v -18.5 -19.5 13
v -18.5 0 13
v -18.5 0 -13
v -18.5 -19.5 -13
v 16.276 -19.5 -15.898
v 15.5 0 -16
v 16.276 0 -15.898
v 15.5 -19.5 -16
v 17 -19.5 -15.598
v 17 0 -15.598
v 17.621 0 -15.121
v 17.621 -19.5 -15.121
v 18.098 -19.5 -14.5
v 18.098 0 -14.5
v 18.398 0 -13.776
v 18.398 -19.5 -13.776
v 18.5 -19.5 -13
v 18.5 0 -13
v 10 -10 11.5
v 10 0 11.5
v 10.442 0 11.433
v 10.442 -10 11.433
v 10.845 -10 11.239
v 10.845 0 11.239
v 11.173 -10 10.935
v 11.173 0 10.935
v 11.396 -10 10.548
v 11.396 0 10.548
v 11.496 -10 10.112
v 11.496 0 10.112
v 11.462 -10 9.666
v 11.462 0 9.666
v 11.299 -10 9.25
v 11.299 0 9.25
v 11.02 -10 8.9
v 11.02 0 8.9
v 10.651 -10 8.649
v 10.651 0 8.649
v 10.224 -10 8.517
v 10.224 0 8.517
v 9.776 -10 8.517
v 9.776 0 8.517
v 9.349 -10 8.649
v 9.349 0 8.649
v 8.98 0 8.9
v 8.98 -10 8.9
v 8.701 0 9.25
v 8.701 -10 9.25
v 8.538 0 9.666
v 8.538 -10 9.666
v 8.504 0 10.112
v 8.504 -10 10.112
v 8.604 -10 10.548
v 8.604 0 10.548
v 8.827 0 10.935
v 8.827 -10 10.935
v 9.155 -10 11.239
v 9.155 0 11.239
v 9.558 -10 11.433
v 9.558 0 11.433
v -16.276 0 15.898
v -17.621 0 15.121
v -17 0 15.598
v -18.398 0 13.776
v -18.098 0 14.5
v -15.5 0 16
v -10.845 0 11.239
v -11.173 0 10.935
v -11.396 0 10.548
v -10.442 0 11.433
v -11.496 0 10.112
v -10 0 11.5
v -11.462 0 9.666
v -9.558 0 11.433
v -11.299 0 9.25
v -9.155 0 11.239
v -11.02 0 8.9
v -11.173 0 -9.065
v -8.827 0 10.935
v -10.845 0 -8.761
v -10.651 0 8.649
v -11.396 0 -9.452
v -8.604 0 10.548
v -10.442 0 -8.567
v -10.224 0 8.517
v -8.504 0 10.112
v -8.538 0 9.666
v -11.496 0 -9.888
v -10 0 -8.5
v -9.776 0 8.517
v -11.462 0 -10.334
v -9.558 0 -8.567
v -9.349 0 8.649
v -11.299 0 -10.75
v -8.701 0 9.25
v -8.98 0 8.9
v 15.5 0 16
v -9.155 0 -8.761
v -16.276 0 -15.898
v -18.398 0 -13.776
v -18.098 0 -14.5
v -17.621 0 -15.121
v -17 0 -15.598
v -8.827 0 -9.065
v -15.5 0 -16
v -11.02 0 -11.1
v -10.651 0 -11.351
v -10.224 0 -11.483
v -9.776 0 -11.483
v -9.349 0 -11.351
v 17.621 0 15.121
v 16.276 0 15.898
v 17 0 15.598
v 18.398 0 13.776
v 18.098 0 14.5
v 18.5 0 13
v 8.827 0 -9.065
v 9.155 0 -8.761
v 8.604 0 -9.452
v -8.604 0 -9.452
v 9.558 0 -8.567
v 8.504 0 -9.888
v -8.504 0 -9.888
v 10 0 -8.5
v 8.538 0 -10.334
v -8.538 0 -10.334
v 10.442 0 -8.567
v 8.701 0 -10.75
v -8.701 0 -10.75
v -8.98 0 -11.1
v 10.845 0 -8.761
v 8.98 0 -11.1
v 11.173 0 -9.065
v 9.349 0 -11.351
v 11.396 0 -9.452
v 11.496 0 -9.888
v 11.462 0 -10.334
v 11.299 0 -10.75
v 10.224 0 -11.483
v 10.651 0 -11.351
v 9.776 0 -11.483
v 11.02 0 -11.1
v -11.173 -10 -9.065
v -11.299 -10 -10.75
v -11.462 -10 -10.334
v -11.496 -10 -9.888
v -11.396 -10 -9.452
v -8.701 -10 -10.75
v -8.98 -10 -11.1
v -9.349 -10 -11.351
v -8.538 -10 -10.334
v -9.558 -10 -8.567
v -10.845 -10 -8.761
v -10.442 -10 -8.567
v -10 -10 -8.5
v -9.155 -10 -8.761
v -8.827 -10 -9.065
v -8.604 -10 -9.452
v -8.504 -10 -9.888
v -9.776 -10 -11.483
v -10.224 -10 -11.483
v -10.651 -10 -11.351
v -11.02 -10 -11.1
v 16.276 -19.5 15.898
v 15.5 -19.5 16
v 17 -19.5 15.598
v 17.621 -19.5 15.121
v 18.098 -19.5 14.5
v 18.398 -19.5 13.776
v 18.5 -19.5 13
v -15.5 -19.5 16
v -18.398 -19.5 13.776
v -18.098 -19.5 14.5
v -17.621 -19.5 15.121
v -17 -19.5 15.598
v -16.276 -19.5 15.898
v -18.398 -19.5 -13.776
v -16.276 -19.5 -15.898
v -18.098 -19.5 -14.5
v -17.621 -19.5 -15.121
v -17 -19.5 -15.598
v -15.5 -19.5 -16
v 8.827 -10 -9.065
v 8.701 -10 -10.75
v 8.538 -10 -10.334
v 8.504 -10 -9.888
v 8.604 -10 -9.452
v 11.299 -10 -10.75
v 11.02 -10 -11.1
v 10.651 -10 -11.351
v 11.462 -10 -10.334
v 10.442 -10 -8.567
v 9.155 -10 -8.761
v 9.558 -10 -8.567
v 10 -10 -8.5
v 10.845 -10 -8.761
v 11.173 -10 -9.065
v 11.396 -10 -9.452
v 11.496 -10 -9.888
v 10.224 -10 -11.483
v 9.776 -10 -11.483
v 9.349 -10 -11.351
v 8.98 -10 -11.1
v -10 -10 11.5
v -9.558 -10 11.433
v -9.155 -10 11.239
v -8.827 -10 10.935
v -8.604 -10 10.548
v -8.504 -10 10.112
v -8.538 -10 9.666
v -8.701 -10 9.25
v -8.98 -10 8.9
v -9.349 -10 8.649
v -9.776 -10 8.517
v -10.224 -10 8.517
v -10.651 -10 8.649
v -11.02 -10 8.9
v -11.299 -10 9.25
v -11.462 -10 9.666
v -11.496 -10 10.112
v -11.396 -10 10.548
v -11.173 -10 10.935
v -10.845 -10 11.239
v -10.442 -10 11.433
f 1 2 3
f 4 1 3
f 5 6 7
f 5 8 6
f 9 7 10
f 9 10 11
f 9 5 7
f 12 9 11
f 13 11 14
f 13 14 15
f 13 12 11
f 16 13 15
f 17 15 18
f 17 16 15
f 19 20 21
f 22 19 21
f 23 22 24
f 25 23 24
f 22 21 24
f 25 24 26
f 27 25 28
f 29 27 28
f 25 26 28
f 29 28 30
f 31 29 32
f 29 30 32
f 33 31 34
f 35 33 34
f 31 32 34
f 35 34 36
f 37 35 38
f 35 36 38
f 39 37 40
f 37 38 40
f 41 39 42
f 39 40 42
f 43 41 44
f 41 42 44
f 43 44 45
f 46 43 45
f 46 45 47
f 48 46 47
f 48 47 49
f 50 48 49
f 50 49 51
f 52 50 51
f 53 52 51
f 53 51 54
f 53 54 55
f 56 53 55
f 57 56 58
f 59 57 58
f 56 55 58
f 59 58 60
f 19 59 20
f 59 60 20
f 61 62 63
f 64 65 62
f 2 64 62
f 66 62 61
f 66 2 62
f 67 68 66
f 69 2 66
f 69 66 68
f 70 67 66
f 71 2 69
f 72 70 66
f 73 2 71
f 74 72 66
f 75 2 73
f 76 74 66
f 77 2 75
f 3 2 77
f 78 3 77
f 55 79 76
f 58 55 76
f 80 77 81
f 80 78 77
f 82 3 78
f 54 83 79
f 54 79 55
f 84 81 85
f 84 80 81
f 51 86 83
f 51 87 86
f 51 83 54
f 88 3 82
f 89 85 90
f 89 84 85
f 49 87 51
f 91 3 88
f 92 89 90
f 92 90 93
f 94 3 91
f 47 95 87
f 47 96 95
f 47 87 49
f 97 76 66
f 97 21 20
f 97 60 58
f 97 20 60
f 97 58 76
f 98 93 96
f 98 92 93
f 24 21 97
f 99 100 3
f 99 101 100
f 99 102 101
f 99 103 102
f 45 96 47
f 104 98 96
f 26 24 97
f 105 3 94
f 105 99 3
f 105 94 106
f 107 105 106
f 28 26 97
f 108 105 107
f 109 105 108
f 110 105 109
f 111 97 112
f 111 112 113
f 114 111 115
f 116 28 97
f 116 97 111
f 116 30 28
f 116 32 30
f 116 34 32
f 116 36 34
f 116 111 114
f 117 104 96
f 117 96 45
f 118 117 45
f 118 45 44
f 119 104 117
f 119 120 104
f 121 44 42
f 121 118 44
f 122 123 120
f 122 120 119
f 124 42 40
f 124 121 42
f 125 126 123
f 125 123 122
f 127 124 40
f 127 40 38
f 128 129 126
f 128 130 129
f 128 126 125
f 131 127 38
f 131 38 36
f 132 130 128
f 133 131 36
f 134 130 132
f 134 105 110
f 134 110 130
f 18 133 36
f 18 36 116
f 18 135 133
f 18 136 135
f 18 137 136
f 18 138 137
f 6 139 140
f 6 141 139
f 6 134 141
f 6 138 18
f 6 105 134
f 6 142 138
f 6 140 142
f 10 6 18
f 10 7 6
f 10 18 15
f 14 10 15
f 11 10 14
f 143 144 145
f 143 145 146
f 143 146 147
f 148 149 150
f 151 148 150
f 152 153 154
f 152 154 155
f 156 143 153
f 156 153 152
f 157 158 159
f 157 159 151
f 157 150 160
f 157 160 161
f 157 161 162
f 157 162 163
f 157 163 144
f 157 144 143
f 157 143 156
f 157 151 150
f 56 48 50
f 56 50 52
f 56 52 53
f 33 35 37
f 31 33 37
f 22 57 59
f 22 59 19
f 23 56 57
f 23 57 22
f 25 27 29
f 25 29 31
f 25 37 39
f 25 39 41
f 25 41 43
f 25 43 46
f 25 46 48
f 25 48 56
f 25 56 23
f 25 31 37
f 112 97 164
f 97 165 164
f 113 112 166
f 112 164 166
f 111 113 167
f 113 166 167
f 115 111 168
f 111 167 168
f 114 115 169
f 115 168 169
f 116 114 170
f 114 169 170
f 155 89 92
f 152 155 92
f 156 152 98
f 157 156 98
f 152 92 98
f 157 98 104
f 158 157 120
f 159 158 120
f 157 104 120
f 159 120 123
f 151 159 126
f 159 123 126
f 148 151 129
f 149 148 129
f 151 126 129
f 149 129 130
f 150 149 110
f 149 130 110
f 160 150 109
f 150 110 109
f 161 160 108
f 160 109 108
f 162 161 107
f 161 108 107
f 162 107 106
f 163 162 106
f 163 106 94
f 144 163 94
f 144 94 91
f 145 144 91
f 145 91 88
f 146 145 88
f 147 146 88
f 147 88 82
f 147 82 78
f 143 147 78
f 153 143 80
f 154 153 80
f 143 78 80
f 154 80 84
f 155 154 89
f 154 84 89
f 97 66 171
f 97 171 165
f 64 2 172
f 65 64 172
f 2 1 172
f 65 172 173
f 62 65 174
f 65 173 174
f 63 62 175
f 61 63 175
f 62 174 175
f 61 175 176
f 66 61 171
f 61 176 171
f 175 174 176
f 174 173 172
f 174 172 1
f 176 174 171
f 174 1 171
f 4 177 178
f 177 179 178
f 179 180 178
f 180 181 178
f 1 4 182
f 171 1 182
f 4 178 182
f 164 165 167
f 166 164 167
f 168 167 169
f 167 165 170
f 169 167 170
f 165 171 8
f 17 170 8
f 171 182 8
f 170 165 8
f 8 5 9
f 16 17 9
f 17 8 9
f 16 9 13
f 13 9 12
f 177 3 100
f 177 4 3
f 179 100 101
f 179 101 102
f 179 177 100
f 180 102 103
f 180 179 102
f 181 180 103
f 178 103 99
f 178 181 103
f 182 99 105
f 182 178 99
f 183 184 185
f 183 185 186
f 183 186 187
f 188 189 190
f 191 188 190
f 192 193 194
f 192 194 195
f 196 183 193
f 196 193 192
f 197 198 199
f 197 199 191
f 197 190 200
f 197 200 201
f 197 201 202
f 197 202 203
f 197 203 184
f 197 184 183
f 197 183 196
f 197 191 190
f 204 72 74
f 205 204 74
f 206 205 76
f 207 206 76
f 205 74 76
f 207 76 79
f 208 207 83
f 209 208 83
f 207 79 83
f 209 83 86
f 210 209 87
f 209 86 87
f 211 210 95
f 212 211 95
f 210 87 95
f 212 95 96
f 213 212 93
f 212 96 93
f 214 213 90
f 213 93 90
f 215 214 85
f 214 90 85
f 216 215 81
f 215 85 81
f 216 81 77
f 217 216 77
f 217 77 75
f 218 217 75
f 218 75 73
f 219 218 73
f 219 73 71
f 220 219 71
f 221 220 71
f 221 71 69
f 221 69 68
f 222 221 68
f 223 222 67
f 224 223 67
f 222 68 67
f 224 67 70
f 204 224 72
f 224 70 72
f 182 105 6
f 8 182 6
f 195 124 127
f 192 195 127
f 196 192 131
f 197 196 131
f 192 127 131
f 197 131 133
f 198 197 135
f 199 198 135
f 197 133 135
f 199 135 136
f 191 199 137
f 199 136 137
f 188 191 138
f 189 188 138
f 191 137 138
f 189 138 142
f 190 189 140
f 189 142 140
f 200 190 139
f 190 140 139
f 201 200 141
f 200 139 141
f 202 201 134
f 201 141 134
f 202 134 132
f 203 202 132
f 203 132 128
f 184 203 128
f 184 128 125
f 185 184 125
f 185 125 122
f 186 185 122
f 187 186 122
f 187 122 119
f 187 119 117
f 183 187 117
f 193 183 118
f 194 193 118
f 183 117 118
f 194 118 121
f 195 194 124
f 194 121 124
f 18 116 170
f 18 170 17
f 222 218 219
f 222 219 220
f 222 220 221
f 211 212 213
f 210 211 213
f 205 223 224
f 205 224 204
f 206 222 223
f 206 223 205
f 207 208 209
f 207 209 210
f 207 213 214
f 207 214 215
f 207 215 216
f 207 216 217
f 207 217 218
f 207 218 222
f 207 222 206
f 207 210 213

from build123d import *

# Parameters (mm, degrees)
SKETCH1_W           = 37
SKETCH1_H           = 32
BOSS_EXTRUDE1_DEPTH = 19.5
SKETCH1_3_R         = 1.5
CUT_EXTRUDE1_DEPTH  = 10
FILLET1_R           = 3


with BuildPart() as part:
    # Sketch1 → Boss-Extrude1 (new body)
    with BuildSketch(Plane(origin=(0, 0, 0), x_dir=(1, 0, 0), z_dir=(0, 1, 0))):
        Rectangle(SKETCH1_W, SKETCH1_H)
    extrude(amount=-BOSS_EXTRUDE1_DEPTH)

    # Sketch1<3> → Cut-Extrude1 (cut)
    with BuildSketch(Plane(origin=(0, 0, 0), x_dir=(1, 0, 0), z_dir=(0, 1, 0))):
        with Locations((-10, 10)):
            Circle(SKETCH1_3_R)
        with Locations((10, 10)):
            Circle(SKETCH1_3_R)
        with Locations((10, -10)):
            Circle(SKETCH1_3_R)
        with Locations((-10, -10)):
            Circle(SKETCH1_3_R)
    extrude(amount=-CUT_EXTRUDE1_DEPTH, mode=Mode.SUBTRACT)

    # Fillet1
    fillet1_edges = [part.edges().sort_by_distance(p)[0] for p in [
        (-18.5, -9.75, -16),
        (18.5, -9.75, -16),
        (18.5, -9.75, 16),
        (-18.5, -9.75, 16),
    ]]
    fillet(fillet1_edges, radius=FILLET1_R)


solid = part.part
